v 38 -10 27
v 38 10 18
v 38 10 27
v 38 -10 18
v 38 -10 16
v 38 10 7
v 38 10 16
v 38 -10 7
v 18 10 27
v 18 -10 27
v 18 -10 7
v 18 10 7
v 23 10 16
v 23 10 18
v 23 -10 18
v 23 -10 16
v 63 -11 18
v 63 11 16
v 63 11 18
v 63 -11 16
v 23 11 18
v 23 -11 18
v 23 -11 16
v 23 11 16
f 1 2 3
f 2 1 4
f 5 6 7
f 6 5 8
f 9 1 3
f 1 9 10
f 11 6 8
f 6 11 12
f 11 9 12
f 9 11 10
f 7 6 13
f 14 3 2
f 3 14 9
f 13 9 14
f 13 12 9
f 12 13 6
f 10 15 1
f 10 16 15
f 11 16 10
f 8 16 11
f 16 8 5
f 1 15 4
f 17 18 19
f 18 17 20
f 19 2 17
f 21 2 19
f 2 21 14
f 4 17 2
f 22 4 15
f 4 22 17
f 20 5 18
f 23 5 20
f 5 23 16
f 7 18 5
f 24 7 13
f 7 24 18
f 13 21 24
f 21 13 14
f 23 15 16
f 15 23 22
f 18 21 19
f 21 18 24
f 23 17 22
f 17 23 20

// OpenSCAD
// Bug found when making foot for Mendel Y platform


post_wid=20;

module spring() {
	// Rough hack.
	union () {
		translate ([0,0,post_wid/2]) cube(post_wid, center=true);
		translate ([15,0,10]) {
			cube([post_wid*2,post_wid*1.1,post_wid*0.1], center=true);
		}
	}
}

translate ([post_wid*1.4,0,post_wid*0.35]) spring();
